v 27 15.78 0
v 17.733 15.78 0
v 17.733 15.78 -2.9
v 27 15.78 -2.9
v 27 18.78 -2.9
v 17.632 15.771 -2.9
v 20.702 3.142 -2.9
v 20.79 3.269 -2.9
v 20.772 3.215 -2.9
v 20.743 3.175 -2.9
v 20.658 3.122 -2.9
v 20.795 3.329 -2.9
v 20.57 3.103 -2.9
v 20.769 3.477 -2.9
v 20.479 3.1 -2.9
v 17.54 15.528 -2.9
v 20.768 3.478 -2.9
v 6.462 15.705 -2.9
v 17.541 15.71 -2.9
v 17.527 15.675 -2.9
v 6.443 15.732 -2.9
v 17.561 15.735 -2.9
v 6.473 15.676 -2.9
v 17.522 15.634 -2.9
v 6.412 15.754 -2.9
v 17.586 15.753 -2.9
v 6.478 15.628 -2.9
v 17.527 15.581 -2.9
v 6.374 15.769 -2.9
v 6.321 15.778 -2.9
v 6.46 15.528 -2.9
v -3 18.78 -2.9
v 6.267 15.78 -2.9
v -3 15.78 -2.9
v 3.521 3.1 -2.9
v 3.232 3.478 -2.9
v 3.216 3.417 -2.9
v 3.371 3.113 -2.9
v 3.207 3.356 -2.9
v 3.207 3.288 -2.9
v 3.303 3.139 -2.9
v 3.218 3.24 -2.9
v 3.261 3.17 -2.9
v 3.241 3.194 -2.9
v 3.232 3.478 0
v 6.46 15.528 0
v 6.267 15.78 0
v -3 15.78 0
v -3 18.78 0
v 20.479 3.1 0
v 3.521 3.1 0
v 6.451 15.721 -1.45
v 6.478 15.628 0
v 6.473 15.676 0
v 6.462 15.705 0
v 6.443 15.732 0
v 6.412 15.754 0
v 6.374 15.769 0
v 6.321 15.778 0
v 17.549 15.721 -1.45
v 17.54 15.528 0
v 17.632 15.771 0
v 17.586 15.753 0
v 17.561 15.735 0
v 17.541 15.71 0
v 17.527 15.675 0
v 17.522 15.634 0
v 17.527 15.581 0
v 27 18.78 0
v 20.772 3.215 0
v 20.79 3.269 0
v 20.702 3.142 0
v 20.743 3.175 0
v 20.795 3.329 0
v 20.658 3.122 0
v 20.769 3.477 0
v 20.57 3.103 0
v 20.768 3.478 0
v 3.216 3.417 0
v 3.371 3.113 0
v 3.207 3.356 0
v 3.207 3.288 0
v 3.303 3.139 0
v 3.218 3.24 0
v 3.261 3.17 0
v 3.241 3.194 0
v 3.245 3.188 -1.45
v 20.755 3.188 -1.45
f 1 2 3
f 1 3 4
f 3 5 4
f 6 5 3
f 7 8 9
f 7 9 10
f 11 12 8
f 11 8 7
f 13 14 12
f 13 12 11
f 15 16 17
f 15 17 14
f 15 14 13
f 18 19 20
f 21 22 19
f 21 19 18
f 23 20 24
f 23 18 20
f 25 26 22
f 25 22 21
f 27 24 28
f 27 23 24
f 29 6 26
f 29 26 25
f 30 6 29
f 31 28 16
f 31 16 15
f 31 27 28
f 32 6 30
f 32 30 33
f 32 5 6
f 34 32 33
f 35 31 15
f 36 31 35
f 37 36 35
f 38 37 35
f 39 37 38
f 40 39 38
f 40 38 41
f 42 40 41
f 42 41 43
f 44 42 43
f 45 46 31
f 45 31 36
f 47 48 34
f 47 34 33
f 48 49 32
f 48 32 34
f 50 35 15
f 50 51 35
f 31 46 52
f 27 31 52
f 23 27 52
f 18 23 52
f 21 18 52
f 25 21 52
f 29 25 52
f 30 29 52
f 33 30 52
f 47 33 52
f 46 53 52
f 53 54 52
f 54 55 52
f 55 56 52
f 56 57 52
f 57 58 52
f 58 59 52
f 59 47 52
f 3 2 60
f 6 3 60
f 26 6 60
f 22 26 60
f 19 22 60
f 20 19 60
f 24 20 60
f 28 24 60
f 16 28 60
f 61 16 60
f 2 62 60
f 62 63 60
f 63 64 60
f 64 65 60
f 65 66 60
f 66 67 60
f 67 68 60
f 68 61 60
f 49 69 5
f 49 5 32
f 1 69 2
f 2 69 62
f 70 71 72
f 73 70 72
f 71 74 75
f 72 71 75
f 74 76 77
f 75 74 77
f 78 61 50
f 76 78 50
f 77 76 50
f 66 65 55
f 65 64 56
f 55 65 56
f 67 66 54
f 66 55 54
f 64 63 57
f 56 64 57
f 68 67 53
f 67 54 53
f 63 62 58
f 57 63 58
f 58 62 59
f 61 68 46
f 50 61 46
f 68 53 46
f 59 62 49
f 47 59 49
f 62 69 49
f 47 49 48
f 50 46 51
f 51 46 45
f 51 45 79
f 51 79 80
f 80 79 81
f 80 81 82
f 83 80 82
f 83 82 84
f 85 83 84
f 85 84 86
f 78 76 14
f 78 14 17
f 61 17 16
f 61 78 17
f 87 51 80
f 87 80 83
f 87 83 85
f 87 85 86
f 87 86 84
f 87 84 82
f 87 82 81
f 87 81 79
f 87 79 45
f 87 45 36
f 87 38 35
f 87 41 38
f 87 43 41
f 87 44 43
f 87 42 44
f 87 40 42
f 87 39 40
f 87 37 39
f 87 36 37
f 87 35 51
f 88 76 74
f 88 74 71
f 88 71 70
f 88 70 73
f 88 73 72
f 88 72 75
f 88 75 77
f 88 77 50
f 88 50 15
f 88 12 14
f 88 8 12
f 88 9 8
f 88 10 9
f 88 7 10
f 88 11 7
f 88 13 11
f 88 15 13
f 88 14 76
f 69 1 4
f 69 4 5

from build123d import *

# Parameters (mm, degrees)
BOSS_EXTRUDE1_DEPTH = 2.9


with BuildPart() as part:
    # Sketch2 → Boss-Extrude1 (new body)
    with BuildSketch(Plane.XY):
        Polygon((6.527918297, 15.78), (3.130322537, 3.1), (20.869677463, 3.1), (17.472081703, 15.78), (27, 15.78), (27, 18.78), (-3, 18.78), (-3, 15.78), align=None)
    extrude(amount=-BOSS_EXTRUDE1_DEPTH)

    # Fillet1
    # a fillet whose section is not a circle: 0.3 mm, written as the material it takes off along each edge
    with BuildSketch(Plane(origin=(3.130322537, 3.1, 0.97741903), x_dir=(0.2588190451025178, 0.9659258262890691, 0), z_dir=(0, 0, -1)), Plane(origin=(20.869677463, 3.1, 0.97741903), x_dir=(-1, 0, 0), z_dir=(0, 0, -1))) as fillet1_piece_1:
        with BuildLine():
            add(Edge.make_bspline([(0.390967612, 0), (0.328357725, 0), (0.265747838, 0), (0.130034743, 0.031807338), (0.064378997, 0.117371571), (0.068780602, 0.2566927), (0.084985233, 0.317169207), (0.101189864, 0.377645714)], knots=[0, 0, 0, 0, 0, 0, 0.5, 0.5, 1, 1, 1, 1, 1, 1], degree=5))
            Line((0.101189864, 0.377645714), (0, 0))
            Line((0, 0), (0.390967612, 0))
        make_face()
    extrude(amount=4.854838059, mode=Mode.SUBTRACT)

    # Fillet2
    # a fillet whose section is not a circle: 0.2 mm, written as the material it adds along each edge
    with BuildSketch(Plane(origin=(6.527918297, 15.78, 0), x_dir=(-0.25881904510252, -0.9659258262890685, 0), z_dir=(0, 0, -1)), Plane(origin=(17.472081703, 15.78, 0), x_dir=(1, 0, 0), z_dir=(0, 0, -1))) as fillet2_piece_1:
        with BuildLine():
            add(Edge.make_bspline([(0.260645075, 0), (0.21890515, 0), (0.177165225, 0), (0.086689828, 0.021204892), (0.042919331, 0.078247714), (0.045853734, 0.171128466), (0.056656822, 0.211446138), (0.067459909, 0.251763809)], knots=[0, 0, 0, 0, 0, 0, 0.5, 0.5, 1, 1, 1, 1, 1, 1], degree=5))
            Line((0.067459909, 0.251763809), (0, 0))
            Line((0, 0), (0.260645075, 0))
        make_face()
    extrude(amount=2.9)


solid = part.part
